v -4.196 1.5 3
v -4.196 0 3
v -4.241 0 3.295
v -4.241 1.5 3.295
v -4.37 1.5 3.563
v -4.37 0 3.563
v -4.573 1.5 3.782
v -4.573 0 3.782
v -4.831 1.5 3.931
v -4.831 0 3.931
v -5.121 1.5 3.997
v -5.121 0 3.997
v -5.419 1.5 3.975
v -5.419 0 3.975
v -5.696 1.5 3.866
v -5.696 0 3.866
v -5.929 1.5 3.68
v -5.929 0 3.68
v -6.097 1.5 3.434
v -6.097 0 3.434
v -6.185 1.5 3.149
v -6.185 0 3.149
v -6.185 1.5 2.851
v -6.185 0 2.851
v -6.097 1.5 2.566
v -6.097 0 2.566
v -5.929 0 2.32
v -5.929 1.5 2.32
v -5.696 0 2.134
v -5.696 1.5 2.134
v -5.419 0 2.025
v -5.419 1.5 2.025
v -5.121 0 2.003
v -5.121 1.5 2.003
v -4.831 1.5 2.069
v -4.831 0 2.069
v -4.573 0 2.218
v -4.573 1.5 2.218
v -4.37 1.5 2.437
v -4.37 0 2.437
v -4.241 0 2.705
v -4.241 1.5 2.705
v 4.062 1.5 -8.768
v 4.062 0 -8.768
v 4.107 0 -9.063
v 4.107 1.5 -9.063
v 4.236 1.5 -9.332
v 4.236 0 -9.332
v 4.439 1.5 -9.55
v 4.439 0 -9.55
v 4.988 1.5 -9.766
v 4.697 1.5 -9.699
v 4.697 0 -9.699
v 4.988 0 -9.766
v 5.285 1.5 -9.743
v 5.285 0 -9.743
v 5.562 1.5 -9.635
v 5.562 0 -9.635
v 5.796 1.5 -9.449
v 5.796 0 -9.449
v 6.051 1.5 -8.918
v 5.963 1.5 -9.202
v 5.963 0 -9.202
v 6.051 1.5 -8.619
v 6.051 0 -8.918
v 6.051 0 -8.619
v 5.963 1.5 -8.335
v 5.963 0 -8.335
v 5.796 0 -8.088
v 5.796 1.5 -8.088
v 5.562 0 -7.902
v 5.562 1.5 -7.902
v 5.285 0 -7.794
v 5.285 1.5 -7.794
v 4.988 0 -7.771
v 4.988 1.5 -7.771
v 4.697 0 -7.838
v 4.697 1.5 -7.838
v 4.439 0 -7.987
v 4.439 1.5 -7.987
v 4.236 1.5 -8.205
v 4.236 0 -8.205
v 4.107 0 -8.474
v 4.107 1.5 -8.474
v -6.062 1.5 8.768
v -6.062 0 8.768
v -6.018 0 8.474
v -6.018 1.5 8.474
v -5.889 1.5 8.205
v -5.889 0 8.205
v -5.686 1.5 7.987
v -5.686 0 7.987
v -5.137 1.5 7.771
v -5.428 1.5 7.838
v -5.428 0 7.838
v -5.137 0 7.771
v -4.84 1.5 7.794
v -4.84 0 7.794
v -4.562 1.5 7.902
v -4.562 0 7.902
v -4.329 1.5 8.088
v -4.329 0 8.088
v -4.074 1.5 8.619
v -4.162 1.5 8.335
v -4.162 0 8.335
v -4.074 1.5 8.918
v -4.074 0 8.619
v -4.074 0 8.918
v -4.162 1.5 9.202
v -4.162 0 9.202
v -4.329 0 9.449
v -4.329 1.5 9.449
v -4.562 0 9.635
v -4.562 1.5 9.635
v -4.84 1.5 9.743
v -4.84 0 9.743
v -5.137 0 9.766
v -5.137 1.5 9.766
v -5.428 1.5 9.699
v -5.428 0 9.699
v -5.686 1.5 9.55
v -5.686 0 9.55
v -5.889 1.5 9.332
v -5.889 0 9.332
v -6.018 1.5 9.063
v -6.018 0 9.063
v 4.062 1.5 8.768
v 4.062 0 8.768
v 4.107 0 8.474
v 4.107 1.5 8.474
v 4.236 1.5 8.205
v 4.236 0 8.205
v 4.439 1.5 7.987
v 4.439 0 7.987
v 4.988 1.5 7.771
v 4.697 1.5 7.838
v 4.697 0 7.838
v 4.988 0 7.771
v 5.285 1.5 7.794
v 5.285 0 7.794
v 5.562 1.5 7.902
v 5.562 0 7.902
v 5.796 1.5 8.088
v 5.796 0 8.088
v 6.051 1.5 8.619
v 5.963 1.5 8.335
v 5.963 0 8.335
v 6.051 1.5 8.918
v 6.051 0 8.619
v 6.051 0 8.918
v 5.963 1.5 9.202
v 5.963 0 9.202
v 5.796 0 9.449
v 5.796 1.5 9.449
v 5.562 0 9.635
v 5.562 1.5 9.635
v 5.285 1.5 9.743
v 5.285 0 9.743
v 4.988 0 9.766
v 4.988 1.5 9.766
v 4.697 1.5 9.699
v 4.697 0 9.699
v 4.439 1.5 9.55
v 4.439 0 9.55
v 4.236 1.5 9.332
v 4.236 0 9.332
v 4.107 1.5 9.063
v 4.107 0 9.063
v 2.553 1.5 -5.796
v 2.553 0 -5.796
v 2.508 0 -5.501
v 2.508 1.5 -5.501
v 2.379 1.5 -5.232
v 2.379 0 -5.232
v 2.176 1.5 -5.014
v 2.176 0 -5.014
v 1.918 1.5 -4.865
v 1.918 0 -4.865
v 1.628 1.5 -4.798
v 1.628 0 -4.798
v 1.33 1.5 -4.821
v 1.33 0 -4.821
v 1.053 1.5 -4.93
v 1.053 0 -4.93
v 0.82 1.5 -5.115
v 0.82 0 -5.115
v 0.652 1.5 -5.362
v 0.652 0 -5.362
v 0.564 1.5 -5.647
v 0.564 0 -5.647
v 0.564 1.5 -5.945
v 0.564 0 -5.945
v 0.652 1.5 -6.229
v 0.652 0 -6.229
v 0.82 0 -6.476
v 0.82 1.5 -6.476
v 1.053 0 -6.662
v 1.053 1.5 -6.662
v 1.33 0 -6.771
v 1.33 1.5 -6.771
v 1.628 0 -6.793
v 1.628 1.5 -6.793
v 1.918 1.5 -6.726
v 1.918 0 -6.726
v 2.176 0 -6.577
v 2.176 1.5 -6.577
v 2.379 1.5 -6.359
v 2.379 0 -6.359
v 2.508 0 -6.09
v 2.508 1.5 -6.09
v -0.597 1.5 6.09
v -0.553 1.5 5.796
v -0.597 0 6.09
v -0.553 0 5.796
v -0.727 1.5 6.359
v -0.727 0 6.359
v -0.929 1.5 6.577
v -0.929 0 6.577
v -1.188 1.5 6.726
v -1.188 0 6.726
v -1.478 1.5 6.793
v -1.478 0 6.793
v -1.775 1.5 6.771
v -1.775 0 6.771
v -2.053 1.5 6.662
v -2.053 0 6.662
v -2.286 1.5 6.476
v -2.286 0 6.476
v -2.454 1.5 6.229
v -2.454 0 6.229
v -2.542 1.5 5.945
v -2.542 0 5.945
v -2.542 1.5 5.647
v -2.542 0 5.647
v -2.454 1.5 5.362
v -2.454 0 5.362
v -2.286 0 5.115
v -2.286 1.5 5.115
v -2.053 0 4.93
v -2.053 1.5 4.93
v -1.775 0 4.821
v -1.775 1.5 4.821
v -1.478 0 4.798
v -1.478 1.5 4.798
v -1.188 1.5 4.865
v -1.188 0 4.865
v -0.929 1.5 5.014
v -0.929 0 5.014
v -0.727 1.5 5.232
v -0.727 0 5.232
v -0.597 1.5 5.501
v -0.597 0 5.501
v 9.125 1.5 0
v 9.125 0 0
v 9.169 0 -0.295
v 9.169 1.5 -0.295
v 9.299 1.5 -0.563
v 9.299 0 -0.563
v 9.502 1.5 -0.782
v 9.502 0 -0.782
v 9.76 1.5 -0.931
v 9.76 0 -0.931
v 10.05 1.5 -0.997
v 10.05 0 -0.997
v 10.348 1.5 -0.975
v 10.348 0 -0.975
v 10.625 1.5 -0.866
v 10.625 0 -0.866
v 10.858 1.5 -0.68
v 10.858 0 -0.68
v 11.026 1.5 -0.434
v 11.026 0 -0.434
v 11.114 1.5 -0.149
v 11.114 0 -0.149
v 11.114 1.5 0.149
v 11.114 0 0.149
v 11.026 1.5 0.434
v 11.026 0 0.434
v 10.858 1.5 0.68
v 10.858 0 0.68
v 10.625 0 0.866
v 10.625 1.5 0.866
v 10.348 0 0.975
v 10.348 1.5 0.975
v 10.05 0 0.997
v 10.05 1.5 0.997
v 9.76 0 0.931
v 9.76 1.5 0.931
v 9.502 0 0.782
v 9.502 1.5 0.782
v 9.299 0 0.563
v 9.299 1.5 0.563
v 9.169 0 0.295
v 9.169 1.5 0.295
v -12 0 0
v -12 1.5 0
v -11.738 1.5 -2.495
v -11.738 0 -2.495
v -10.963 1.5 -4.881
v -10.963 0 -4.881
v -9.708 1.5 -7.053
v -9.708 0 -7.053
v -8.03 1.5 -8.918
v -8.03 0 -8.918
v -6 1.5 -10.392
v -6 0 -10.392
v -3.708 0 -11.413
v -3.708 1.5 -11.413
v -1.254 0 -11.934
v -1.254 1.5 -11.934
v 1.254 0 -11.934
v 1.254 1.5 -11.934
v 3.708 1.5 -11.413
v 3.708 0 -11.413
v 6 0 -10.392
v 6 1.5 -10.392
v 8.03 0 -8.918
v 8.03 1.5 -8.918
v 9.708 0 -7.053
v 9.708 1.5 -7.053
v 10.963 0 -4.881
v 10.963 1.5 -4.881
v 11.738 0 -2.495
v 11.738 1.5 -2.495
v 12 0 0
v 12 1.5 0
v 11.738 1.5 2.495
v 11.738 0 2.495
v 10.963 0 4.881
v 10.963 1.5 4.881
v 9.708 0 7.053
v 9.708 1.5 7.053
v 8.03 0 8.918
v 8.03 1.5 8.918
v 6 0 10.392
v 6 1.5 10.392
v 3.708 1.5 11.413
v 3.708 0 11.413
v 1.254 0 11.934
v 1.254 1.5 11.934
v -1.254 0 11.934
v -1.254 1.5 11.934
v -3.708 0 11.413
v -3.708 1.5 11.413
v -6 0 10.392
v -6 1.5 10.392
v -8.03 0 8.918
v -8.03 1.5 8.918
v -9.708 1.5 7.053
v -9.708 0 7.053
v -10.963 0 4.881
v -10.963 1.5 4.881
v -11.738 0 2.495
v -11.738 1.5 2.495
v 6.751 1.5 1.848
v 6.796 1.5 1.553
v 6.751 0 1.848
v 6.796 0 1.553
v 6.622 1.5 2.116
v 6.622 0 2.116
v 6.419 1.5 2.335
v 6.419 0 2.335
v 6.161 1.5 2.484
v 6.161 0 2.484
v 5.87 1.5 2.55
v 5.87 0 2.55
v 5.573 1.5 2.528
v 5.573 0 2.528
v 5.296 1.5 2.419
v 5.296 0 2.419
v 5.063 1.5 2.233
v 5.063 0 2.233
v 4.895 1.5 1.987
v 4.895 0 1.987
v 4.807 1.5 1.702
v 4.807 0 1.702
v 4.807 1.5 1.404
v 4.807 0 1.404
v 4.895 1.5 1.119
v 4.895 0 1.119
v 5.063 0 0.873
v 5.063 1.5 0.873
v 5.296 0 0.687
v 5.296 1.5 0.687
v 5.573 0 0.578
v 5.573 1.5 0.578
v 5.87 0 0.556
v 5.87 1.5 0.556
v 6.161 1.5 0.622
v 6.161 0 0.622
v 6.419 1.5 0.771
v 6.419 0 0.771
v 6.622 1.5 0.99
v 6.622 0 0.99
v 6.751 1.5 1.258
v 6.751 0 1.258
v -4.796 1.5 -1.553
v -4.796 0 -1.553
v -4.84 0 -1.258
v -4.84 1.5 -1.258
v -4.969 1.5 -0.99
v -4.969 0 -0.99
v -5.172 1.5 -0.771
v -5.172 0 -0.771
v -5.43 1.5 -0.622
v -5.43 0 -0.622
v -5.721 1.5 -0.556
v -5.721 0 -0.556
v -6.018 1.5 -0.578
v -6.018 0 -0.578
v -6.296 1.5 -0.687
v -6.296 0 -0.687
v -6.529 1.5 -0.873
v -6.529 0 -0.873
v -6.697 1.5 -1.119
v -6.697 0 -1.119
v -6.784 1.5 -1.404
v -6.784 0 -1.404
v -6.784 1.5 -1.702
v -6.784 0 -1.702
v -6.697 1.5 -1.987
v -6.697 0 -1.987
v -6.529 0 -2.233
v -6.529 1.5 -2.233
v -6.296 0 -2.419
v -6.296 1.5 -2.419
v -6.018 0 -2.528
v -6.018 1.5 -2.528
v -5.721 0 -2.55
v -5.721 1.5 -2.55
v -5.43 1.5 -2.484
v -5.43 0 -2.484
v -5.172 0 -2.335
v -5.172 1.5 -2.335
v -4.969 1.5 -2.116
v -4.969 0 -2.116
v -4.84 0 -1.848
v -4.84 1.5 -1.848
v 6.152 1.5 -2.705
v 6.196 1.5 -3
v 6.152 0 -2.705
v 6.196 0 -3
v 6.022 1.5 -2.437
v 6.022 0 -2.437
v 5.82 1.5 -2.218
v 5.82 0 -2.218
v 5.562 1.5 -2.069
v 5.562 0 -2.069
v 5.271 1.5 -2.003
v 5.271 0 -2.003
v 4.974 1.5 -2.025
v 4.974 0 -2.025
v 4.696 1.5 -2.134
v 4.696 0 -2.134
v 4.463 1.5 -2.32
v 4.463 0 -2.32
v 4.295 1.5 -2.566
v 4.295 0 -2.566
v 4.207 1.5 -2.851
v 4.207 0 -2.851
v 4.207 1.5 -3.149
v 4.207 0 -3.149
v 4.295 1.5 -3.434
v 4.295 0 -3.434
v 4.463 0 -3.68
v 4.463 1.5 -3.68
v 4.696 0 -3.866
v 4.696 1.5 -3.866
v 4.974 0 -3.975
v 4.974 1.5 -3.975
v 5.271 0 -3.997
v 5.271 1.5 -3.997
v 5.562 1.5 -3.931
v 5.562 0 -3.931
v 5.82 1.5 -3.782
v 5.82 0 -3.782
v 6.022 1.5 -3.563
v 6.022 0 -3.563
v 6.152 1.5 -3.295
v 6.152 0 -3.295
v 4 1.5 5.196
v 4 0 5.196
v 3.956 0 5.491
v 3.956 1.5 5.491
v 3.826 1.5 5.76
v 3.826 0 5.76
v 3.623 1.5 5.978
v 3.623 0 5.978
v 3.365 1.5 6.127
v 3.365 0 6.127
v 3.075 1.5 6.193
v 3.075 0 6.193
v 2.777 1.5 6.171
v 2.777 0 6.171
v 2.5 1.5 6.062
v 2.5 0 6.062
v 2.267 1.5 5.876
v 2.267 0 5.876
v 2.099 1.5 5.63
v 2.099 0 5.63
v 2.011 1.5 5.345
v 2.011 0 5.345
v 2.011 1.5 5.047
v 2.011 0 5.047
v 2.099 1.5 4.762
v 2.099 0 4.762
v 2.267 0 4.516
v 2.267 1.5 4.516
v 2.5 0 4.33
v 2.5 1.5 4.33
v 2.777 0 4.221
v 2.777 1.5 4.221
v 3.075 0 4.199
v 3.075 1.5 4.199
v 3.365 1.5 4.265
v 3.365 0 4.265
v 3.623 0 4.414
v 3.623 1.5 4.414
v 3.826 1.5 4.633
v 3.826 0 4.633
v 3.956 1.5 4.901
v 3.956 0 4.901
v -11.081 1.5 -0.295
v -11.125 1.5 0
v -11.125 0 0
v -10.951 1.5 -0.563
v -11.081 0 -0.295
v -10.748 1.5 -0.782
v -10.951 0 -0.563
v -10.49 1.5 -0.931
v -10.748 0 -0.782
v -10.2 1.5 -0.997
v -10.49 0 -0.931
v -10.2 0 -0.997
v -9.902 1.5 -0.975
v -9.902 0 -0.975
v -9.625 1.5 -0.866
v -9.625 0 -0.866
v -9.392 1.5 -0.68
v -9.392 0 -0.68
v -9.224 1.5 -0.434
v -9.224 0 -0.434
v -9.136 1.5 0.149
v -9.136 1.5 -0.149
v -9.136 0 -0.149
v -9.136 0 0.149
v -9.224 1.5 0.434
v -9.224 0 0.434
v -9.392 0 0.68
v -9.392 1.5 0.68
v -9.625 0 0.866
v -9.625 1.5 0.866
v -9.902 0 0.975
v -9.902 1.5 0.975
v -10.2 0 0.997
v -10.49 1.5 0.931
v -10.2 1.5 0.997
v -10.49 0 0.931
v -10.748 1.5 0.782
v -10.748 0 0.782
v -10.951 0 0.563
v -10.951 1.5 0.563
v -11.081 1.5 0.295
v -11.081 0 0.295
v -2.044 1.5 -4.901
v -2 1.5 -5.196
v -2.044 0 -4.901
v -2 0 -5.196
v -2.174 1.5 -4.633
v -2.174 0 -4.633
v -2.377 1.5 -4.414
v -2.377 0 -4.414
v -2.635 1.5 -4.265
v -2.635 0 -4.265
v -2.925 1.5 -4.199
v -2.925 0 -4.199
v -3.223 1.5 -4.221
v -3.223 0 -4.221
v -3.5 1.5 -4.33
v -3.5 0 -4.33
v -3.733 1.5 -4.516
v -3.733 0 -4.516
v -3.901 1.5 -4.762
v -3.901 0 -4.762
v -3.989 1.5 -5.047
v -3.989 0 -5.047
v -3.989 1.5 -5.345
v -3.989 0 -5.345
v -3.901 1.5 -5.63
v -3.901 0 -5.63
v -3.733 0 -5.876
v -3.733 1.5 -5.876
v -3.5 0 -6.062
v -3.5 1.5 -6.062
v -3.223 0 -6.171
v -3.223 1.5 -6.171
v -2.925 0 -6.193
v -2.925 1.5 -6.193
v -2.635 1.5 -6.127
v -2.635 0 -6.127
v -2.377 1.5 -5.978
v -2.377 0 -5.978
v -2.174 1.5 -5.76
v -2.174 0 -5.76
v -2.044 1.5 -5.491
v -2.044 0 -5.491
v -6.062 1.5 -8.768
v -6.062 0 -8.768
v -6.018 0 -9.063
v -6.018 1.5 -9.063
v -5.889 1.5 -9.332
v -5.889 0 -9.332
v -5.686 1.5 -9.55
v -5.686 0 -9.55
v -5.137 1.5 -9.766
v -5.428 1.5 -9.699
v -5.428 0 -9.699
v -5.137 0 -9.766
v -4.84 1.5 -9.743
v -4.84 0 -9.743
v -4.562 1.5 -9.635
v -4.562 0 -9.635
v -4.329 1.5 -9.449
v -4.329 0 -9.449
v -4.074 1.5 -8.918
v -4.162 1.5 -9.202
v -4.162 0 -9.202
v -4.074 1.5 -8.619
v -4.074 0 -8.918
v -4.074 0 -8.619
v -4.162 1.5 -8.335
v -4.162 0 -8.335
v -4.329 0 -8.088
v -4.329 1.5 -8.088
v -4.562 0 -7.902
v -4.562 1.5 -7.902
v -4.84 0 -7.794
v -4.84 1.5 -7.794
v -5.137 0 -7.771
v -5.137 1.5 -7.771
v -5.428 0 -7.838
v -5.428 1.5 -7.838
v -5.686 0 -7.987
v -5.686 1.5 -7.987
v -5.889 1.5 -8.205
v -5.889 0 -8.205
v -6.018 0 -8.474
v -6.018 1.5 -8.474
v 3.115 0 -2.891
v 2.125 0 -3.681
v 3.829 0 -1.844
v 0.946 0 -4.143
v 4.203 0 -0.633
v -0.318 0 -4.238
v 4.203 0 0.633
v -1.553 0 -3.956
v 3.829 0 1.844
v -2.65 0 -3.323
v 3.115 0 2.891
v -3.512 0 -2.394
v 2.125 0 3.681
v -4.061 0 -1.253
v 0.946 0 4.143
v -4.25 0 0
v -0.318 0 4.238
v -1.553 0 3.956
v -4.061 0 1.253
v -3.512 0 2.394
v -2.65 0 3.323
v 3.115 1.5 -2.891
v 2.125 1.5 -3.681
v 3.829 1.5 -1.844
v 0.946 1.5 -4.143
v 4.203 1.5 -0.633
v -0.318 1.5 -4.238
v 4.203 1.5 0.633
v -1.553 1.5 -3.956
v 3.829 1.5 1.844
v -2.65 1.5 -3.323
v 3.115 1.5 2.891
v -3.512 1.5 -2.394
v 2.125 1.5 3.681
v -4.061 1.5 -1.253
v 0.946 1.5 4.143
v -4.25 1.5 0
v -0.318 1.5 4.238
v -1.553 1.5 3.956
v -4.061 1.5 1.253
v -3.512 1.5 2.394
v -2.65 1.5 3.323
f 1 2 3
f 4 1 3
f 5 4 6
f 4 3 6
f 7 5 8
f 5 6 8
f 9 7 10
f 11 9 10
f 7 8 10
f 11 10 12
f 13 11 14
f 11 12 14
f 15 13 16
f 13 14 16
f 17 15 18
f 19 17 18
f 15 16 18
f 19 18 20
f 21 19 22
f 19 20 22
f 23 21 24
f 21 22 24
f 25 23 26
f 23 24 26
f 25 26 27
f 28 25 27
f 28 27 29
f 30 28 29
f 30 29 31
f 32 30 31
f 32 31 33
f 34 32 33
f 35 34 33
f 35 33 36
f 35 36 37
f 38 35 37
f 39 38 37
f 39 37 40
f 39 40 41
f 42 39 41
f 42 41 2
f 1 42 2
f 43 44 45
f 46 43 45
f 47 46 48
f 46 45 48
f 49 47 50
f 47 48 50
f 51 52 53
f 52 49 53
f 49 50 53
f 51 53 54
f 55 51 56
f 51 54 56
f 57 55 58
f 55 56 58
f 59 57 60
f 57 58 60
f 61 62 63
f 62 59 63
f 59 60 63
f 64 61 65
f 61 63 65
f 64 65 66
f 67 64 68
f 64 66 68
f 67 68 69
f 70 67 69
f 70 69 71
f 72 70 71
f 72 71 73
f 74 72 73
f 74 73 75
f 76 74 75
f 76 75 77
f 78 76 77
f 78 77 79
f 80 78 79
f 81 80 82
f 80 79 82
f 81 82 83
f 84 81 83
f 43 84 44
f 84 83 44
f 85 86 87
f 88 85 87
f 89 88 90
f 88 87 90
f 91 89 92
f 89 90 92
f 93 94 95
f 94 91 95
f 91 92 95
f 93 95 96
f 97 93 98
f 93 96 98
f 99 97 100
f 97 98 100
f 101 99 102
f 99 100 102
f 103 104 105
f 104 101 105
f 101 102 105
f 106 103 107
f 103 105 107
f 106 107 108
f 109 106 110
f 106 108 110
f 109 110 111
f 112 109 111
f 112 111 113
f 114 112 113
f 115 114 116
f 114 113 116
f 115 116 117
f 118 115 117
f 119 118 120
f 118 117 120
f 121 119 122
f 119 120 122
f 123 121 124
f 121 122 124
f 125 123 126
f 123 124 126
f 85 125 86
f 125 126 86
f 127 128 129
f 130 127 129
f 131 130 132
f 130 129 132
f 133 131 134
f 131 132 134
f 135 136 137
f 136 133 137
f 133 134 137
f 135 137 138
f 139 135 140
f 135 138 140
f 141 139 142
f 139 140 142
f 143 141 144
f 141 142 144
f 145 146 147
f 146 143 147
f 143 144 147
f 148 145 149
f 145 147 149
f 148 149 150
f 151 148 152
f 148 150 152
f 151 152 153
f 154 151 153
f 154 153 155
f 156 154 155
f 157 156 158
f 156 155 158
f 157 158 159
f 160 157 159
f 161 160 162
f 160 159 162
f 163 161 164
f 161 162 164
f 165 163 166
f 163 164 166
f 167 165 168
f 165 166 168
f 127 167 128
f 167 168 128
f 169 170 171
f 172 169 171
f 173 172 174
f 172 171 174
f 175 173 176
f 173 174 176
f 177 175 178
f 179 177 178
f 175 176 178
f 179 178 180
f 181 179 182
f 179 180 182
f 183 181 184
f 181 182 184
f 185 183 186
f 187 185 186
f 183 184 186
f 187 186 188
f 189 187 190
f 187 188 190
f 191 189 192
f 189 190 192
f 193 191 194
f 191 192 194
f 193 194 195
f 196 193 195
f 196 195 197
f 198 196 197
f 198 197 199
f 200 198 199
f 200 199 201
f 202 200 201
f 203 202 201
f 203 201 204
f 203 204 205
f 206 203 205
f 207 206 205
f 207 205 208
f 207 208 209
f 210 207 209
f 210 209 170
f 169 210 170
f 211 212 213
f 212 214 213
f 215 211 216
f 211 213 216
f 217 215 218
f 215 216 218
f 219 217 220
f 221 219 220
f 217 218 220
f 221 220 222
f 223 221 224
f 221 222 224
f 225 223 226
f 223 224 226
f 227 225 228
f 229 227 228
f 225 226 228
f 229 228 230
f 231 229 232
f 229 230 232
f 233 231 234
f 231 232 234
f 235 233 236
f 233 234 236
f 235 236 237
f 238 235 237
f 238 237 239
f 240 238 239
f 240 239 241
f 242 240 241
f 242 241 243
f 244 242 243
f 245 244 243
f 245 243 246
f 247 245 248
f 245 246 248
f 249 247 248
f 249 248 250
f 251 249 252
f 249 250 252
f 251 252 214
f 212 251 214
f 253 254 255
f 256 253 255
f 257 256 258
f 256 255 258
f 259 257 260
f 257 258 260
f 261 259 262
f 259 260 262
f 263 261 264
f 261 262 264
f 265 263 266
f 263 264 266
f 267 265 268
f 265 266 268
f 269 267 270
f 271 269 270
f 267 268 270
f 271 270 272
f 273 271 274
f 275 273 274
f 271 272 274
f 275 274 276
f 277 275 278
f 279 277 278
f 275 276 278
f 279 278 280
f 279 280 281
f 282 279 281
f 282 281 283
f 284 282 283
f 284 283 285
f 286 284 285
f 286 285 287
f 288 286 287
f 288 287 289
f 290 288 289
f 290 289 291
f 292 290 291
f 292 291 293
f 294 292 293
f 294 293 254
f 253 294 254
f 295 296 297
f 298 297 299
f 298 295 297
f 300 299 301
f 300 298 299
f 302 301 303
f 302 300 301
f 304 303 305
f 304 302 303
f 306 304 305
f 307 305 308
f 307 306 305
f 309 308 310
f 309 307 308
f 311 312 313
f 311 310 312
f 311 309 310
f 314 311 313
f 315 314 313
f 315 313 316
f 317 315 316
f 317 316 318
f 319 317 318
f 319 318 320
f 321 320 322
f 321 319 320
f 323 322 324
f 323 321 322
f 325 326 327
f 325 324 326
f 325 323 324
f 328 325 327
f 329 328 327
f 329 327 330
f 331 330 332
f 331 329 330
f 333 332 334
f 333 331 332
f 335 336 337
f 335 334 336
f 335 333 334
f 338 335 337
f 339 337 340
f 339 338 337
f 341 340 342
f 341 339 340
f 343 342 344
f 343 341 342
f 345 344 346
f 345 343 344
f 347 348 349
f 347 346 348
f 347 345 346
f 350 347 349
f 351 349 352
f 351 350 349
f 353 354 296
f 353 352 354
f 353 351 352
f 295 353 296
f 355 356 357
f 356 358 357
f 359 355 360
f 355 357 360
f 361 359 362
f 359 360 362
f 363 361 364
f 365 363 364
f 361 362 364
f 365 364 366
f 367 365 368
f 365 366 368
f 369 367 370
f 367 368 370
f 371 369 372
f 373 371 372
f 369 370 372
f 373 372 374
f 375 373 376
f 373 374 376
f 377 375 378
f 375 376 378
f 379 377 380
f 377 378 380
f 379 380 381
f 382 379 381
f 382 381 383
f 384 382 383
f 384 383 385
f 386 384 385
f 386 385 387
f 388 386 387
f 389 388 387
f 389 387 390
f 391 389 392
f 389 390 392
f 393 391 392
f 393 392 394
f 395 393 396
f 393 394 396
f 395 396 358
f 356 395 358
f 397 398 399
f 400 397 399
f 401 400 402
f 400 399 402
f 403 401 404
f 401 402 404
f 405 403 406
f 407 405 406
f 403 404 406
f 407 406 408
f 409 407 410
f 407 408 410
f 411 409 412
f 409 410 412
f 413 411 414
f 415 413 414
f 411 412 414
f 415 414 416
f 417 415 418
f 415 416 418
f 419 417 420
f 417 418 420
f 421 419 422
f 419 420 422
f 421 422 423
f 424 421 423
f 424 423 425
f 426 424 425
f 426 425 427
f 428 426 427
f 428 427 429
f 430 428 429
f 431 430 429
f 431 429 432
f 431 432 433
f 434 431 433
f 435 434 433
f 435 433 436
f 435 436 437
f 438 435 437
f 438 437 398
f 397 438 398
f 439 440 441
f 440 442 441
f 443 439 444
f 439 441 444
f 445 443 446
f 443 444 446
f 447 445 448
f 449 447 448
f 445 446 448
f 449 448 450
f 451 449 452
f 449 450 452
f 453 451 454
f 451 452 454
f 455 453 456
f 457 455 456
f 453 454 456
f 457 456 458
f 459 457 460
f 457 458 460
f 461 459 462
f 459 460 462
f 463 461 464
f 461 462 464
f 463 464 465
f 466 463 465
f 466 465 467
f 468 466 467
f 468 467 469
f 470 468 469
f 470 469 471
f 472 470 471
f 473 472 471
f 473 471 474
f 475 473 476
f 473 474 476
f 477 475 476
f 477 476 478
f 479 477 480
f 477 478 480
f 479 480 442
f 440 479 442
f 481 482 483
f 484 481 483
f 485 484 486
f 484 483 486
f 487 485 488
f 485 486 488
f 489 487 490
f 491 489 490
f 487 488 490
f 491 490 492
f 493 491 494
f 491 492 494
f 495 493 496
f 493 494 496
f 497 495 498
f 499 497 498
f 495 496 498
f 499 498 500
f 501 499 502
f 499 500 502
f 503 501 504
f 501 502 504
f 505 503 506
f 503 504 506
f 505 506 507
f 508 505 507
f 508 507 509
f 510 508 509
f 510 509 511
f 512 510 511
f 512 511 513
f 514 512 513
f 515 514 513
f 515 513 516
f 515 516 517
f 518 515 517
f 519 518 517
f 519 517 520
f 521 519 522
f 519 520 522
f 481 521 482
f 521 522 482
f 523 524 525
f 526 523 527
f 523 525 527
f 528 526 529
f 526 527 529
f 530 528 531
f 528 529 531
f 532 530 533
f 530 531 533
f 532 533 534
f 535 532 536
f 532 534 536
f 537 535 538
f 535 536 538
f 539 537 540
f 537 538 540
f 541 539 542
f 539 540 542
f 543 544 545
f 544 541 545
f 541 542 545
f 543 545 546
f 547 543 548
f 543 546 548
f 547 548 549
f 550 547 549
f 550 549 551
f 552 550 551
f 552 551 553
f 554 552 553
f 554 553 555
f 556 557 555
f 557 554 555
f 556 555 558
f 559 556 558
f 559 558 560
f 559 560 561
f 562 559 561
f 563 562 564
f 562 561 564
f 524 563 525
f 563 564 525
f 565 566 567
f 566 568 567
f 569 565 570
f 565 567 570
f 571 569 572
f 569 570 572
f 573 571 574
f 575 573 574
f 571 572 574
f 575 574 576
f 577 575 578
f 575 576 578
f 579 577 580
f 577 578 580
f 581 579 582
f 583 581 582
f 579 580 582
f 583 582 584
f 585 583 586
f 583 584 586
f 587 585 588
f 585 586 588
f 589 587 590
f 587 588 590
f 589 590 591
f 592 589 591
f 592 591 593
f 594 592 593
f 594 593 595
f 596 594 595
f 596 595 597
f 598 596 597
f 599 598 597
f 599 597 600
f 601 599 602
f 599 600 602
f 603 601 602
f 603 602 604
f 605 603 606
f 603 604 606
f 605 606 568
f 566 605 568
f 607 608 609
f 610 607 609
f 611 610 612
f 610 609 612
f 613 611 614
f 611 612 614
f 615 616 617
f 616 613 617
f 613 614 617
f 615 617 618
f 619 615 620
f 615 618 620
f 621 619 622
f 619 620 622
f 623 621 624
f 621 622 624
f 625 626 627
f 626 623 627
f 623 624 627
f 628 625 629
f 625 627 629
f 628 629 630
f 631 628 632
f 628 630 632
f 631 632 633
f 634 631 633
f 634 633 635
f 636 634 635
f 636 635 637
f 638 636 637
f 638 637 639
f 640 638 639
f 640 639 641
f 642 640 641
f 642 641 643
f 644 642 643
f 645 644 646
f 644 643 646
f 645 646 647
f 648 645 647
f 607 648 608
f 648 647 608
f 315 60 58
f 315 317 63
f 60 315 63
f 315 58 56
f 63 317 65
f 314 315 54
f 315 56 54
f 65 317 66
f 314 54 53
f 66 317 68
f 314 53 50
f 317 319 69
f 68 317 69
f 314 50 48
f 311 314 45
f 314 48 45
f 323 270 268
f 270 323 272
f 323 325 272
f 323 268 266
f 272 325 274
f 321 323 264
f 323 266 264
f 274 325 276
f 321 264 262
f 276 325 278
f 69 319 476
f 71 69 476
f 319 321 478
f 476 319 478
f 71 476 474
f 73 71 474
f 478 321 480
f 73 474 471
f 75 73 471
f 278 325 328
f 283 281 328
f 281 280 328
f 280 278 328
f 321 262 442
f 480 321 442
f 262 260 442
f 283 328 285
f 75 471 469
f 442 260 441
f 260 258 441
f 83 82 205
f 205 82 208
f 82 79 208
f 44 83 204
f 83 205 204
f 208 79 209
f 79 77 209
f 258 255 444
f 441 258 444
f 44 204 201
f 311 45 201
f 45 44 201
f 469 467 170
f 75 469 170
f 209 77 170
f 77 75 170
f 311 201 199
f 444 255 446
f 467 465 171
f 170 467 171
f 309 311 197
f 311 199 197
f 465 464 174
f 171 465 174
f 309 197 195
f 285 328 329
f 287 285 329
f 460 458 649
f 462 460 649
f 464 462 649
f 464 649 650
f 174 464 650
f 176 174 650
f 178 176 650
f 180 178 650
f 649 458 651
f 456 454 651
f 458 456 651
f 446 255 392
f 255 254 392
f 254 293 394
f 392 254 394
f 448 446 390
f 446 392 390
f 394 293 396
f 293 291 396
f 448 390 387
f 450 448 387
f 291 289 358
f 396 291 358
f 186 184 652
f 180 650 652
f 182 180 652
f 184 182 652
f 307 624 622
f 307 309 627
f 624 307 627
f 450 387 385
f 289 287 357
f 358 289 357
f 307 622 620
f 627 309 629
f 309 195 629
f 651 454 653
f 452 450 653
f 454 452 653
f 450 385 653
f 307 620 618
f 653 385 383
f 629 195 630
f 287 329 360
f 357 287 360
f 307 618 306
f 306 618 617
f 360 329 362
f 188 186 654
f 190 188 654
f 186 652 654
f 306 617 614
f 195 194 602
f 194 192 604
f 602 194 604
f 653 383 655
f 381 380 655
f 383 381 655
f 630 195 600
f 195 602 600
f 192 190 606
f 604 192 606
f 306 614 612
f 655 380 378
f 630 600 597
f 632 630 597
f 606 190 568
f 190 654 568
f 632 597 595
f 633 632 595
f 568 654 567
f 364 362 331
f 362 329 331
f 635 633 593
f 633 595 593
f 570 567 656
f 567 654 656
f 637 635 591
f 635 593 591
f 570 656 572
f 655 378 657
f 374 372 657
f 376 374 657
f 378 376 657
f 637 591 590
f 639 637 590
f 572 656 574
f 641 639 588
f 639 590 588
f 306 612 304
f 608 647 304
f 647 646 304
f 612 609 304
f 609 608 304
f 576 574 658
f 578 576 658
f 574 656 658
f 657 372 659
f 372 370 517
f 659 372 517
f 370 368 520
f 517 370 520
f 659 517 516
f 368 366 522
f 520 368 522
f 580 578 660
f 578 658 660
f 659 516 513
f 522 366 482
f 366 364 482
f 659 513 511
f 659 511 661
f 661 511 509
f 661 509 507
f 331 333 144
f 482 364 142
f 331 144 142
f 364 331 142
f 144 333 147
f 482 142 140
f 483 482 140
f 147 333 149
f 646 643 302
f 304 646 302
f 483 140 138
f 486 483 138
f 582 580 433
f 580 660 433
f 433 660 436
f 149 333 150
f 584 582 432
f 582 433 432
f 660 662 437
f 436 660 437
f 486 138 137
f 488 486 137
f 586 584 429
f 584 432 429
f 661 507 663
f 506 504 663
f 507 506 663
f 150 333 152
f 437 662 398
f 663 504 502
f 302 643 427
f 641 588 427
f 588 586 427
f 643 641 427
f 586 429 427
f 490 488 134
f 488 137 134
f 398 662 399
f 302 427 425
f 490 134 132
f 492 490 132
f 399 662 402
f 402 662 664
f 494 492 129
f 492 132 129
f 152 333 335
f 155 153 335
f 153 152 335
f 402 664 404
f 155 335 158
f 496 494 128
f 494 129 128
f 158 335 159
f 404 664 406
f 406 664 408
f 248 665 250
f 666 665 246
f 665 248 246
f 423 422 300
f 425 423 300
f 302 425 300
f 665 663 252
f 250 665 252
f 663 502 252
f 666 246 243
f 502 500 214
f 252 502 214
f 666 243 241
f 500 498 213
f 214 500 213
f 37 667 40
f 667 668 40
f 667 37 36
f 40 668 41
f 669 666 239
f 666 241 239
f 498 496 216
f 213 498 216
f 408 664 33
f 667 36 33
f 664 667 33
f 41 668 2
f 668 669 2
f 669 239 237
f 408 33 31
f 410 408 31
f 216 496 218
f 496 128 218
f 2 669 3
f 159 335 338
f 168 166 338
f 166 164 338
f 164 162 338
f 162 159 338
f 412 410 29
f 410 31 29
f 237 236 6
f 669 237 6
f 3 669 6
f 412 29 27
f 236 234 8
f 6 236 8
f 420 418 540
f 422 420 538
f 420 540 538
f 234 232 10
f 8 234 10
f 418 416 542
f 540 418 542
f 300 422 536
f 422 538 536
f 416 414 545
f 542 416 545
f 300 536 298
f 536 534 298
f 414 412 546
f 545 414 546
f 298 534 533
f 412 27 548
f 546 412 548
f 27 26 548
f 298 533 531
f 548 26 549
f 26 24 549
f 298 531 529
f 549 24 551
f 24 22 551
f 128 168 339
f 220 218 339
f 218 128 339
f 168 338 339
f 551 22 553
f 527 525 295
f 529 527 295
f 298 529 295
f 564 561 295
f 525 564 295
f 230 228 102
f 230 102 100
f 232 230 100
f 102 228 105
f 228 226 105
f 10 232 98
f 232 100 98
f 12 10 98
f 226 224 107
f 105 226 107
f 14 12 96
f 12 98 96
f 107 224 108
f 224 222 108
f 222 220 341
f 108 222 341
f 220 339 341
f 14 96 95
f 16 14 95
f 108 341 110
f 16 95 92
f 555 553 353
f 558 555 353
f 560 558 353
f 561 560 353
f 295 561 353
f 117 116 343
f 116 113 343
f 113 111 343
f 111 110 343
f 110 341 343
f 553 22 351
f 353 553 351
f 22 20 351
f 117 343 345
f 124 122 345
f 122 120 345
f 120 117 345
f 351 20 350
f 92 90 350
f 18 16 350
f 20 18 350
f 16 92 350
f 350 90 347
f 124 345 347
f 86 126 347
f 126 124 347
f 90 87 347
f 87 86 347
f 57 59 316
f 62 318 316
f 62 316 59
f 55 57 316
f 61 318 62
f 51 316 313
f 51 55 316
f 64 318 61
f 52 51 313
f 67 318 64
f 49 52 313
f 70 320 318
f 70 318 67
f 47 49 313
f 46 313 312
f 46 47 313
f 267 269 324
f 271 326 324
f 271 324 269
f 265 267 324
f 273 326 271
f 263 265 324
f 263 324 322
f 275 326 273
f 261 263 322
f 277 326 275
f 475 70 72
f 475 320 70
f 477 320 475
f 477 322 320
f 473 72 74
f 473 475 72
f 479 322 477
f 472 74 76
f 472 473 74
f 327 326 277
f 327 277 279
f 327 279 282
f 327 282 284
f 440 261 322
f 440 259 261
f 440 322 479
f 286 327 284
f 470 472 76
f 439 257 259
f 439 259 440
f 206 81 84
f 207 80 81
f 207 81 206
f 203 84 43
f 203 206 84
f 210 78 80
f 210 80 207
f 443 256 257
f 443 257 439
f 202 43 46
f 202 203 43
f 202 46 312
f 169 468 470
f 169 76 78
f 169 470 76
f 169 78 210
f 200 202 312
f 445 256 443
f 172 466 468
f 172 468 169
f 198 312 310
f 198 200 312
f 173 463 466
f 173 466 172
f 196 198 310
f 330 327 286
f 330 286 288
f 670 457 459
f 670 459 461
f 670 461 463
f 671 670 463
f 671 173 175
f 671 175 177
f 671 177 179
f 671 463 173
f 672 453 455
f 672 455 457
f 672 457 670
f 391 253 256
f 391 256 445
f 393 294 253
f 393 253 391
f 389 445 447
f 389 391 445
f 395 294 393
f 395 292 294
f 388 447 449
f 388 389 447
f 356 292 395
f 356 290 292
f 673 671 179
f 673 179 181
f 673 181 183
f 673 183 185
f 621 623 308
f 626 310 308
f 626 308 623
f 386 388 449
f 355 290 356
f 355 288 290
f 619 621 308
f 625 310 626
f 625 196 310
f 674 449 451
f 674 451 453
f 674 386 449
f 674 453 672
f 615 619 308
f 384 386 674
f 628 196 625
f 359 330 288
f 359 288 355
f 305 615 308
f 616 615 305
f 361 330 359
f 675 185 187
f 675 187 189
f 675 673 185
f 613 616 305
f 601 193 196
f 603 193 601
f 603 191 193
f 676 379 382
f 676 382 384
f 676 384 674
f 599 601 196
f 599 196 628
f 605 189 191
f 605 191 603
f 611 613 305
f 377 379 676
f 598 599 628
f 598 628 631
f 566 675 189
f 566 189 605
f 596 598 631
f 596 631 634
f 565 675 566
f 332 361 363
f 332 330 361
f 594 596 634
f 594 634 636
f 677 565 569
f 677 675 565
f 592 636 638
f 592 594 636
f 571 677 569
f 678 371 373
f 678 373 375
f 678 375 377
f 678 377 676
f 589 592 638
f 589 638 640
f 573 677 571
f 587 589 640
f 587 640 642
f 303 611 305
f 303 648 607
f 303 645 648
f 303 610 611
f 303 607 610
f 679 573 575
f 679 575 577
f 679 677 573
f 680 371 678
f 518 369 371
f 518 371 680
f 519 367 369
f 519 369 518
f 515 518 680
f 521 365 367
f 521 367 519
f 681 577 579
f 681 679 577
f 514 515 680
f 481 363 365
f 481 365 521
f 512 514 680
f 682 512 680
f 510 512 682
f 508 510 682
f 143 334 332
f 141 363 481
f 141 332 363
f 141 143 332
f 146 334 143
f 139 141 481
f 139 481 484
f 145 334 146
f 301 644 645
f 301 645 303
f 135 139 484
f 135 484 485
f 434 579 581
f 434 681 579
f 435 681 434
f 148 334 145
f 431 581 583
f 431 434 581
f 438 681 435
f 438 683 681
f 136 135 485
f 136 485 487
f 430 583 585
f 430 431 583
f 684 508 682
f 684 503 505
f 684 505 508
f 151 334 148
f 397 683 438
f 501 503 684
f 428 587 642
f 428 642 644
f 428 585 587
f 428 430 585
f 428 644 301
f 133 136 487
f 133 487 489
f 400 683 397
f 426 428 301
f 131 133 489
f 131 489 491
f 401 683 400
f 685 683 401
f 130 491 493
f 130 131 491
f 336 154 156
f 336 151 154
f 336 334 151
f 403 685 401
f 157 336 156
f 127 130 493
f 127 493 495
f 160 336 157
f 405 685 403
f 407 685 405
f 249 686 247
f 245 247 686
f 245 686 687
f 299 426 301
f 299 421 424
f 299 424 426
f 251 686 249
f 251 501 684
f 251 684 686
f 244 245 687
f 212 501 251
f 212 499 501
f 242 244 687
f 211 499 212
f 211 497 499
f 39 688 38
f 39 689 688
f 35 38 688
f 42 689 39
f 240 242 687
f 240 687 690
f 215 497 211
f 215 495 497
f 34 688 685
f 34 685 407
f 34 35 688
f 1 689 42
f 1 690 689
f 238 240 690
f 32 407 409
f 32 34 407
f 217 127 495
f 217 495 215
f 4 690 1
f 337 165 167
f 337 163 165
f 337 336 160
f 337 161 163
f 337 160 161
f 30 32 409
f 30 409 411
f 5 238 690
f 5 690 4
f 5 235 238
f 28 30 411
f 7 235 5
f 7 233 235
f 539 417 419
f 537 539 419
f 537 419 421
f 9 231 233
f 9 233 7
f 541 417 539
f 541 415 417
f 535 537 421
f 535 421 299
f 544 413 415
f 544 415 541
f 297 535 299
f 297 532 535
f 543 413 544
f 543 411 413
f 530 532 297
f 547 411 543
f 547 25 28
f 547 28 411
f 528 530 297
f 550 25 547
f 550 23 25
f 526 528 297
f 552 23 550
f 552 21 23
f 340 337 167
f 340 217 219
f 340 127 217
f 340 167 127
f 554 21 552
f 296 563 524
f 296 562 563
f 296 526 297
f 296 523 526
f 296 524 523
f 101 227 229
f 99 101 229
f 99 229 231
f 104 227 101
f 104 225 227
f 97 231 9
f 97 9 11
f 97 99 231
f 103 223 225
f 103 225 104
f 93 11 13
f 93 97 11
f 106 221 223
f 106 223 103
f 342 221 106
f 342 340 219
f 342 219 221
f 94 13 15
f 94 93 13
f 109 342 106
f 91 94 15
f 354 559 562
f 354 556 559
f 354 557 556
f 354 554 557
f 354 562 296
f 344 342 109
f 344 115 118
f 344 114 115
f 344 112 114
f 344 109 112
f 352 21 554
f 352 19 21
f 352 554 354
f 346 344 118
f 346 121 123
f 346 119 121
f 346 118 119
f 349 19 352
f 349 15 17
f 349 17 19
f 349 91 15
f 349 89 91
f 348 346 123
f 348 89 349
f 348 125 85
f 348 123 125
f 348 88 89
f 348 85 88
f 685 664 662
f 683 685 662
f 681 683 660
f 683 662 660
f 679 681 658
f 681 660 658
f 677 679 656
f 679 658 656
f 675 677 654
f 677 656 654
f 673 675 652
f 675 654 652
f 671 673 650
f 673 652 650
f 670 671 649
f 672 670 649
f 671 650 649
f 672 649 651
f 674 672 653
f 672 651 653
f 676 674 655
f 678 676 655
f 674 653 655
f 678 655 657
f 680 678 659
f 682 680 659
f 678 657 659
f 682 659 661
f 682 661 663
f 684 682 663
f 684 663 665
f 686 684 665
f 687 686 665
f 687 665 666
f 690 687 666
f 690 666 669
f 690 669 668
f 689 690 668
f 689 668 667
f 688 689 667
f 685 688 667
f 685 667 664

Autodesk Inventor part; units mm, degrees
ref_plane "YZ Plane" through (0, 0, 0) normal (1, 0, 0) x (0, 1, 0)
ref_plane "XZ Plane" through (0, 0, 0) normal (0, 1, 0) x (-1, 0, 0)
ref_plane "XY Plane" through (0, 0, 0) normal (0, 0, 1) x (1, 0, 0)
sketch "スケッチ1" plane through (0, 0, 0) normal (0, 1, 0) x (-1, 0, 0)
  circle A0 centre (0, 0) radius 8.25 construction
  circle A1 centre (0, 0) radius 12
  circle A2 centre (0, 0) radius 10.125 construction
  circle A3 centre (10.125, 0) radius 1
  line L0 (16.8, 0) -> (-16.8, 0)
  circle A4 centre (5.0625, 8.7685) radius 1
  circle A5 centre (-5.0625, 8.7685) radius 1
  circle A6 centre (-10.125, 0) radius 1
  circle A7 centre (-5.0625, -8.7685) radius 1
  circle A8 centre (5.0625, -8.7685) radius 1
  circle A9 centre (0, 0) radius 4.25
  dimension "d3" = 20.25
  dimension "d0" = 16.5
  dimension "d1" = 24
  dimension "d4" = 2
  dimension "d7" = 360
  dimension "d9" = 8.5
extrude "プレート1" add sketch "スケッチ1" along normal blind 1.5 contours L0 A3 A9 A6 A1 | A1 L0 A6 A9 A3
sketch "スケッチ2" plane through (0, 0, 0) normal (0, -1, 0) x (1, 0, 0)
  circle A0 centre (5.1962, -3) radius 1 projected
  circle A1 centre (5.7956, 1.5529) radius 1 projected
  circle A2 centre (3, 5.1962) radius 1 projected
  circle A3 centre (-5.7956, -1.5529) radius 1 projected
  line L0 (17.8564, -1.0718) -> (9.8564, -14.9282) projected
  line L1 (-17.8564, 1.0718) -> (-12.4853, -2.0292) projected
  arc A4 (11.5588, 3.2239) -> (-2.9874, 11.6222) centre (0, 0) ccw projected
  line L2 (4.4853, -11.8272) -> (9.8564, -14.9282) projected
  line L3 (-17.8564, 1.0718) -> (-9.8564, 14.9282) projected
  line L4 (17.8564, -1.0718) -> (12.4853, 2.0292) projected
  arc A5 (-11.5588, -3.2239) -> (2.9874, -11.6222) centre (0, 0) ccw projected
  line L5 (-4.4853, 11.8272) -> (-9.8564, 14.9282) projected
  circle A6 centre (-5.7956, -1.5529) radius 1 projected
  circle A7 centre (-3, -5.1962) radius 1 projected
  circle A8 centre (0, 0) radius 4.25 projected
  circle A9 centre (1.5529, -5.7956) radius 1 projected
  circle A10 centre (5.1962, -3) radius 1 projected
  circle A11 centre (5.7956, 1.5529) radius 1 projected
  circle A12 centre (3, 5.1962) radius 1 projected
  circle A13 centre (1.5529, -5.7956) radius 1 projected
  circle A14 centre (-5.0625, 8.7685) radius 1 projected
  circle A15 centre (-5.0625, -8.7685) radius 1 projected
  circle A16 centre (10.125, 0) radius 1 projected
  circle A17 centre (5.0625, -8.7685) radius 1 projected
  circle A18 centre (-10.125, 0) radius 1 projected
  circle A19 centre (5.0625, 8.7685) radius 1 projected
  arc A20 (4.4853, -11.8272) -> (2.9874, -11.6222) centre (3.4853, -13.5592) ccw projected
  arc A21 (-11.5588, -3.2239) -> (-12.4853, -2.0292) centre (-13.4853, -3.7613) ccw projected
  arc A22 (-4.4853, 11.8272) -> (-2.9874, 11.6222) centre (-3.4853, 13.5592) ccw projected
  arc A23 (11.5588, 3.2239) -> (12.4853, 2.0292) centre (13.4853, 3.7613) ccw projected
  circle A24 centre (-5.1962, 3) radius 1 projected
  circle A25 centre (-1.5529, 5.7956) radius 1 projected
  point P0 (0, 0)
  point P1 (0, 0)
  point P2 (0, 0)
  point P3 (0, 0)
  point P4 (0, 0)
  point P5 (9.798, -10)
  point P6 (-9.798, -10)
  point P7 (-9.798, 10)
  point P8 (9.798, 10)
extrude "切り取り1" cut sketch "スケッチ2" against normal blind 1.5 contours A0 | A1 | A2 | A3 | A7 | A9 | A24 | A25
equation "\"d3\" = 0.5 * d0 + 0.5 * d1"
equation "\"d10\" = Thickness"
equation "\"d2\" = Thickness"
equation "\"BendRadius\" = Thickness"
equation "\"BendReliefWidth\" = Thickness"
equation "\"BendReliefDepth\" = 0.5 * Thickness"
equation "\"CornerReliefSize\" = 4 * Thickness"
equation "\"MinimumRemnant\" = 2 * Thickness"
equation "\"TransitionRadius\" = BendRadius"
equation "\"JacobiRadiusSize\" = BendRadius"
equation "\"GapSize\" = Thickness"
equation "\"Thickness\" = 1.5"
properties part number "sholder_joint_s" material "アルミニウム 6061"
